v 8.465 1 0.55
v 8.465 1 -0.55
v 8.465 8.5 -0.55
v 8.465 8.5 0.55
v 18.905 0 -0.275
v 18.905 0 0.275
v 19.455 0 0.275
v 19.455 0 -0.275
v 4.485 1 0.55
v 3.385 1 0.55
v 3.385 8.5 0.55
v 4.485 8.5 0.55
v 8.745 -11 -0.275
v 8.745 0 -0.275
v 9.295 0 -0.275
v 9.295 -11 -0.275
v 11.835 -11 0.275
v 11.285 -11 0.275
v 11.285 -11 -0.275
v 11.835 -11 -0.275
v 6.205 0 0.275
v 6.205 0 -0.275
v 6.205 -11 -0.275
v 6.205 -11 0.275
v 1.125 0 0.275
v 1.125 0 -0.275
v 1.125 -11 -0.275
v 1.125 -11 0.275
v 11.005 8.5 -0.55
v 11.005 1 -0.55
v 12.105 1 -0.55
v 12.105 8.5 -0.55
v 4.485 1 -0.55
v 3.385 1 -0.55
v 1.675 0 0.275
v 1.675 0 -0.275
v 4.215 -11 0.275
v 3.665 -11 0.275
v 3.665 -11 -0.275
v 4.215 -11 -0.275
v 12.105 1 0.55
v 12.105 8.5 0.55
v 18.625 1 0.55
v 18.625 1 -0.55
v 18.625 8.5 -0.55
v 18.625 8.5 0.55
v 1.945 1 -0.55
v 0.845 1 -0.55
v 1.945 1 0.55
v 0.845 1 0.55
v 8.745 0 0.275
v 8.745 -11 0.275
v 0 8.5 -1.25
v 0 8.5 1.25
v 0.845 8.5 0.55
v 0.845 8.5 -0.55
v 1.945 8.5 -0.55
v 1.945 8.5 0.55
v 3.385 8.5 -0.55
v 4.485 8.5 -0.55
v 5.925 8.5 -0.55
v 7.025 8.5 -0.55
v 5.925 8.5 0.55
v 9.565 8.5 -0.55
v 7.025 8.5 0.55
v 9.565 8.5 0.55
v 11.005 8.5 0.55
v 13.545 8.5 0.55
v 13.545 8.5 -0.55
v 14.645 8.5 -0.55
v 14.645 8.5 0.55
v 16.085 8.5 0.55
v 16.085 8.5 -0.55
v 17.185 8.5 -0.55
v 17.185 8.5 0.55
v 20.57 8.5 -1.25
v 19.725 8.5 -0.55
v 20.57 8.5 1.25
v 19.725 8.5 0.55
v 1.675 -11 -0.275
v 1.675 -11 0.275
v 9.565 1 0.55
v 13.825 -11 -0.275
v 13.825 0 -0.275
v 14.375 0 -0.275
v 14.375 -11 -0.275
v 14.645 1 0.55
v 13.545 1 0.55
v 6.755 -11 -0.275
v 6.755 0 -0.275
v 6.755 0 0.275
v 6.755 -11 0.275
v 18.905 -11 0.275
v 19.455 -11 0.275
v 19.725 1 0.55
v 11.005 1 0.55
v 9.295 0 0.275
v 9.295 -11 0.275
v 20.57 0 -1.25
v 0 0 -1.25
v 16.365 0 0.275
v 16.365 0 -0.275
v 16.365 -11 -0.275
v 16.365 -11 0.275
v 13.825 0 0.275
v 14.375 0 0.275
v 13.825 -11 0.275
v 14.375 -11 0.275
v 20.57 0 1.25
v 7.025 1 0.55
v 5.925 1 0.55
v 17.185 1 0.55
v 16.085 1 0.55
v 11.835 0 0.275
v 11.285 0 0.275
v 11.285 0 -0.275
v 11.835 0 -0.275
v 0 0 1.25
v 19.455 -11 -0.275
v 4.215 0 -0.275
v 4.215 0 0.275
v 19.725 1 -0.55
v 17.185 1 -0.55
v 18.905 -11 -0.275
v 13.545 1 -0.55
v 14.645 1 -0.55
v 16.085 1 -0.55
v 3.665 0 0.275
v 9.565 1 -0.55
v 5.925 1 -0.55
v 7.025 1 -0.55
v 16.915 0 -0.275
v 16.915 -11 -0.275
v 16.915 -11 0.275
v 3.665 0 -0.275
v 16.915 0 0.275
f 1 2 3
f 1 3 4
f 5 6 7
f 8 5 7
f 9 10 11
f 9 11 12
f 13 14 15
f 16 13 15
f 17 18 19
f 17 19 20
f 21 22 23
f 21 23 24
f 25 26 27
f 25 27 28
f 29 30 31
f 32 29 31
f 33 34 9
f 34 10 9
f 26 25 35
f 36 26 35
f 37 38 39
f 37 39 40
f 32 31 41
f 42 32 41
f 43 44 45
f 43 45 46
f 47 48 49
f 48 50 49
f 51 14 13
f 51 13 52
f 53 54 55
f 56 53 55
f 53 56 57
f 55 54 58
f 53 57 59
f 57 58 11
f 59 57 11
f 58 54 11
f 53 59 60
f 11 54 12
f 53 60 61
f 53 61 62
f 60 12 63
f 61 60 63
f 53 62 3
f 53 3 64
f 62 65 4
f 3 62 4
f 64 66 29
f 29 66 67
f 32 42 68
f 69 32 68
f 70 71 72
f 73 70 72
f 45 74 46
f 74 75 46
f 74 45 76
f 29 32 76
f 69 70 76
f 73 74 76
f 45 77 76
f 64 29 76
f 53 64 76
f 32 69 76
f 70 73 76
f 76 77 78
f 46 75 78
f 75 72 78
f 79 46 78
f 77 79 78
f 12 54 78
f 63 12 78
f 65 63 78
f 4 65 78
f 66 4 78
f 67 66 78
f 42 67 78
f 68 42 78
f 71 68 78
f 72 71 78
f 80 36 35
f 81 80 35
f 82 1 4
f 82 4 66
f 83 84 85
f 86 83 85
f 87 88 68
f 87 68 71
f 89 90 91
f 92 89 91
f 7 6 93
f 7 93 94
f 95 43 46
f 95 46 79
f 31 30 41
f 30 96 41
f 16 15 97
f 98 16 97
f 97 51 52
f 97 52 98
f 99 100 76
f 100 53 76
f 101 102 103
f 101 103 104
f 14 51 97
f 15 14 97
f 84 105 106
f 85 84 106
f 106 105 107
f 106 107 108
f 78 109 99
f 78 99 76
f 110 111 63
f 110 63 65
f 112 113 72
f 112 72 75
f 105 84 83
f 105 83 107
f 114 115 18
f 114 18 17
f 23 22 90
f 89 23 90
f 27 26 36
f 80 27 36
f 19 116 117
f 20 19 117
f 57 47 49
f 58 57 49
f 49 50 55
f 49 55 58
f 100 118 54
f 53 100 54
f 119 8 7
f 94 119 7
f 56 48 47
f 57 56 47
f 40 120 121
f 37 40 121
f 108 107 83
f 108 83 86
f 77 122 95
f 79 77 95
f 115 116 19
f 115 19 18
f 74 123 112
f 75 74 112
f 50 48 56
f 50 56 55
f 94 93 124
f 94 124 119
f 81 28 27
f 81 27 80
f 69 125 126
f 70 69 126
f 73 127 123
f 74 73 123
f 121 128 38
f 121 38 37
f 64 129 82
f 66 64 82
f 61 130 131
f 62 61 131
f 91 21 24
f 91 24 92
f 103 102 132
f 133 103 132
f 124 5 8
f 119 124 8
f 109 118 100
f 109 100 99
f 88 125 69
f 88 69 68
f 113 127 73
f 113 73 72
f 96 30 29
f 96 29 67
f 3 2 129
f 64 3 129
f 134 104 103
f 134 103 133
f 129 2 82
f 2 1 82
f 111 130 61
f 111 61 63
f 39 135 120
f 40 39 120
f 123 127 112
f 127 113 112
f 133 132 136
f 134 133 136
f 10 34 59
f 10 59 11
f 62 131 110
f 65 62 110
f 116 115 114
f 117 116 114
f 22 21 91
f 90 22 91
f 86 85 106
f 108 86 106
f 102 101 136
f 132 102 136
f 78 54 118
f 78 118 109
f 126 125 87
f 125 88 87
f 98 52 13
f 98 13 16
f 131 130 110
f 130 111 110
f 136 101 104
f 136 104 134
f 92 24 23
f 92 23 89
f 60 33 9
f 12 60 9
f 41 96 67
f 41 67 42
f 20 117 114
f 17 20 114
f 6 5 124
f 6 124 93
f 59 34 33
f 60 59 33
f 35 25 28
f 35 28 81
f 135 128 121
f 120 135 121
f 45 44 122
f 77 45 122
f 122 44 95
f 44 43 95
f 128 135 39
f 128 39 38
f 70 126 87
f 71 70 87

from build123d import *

# Parameters (mm, degrees)
SKETCH1_W             = 20.57
SKETCH1_H             = 8.5
BOSS_EXTRUDE1_DEPTH   = 1.25
SKETCH2_W             = 1.1
SKETCH2_H             = 1.1
CUT_EXTRUDE1_DEPTH    = 9.5
SKETCH3_W             = 20.57
SKETCH3_H             = 2.5
BOSS_EXTRUDE2_DEPTH   = 1
SKETCH4_W             = 0.55
SKETCH4_H             = 0.55
BOSS_EXTRUDE3_DEPTH   = 11
BOSS_EXTRUDE3_2_DEPTH = 11
BOSS_EXTRUDE3_3_DEPTH = 11
BOSS_EXTRUDE3_4_DEPTH = 11
BOSS_EXTRUDE3_5_DEPTH = 11
BOSS_EXTRUDE3_6_DEPTH = 11
BOSS_EXTRUDE3_7_DEPTH = 11
BOSS_EXTRUDE3_8_DEPTH = 11


with BuildPart() as part:
    # Sketch1 → Boss-Extrude1 (new body, symmetric)
    with BuildSketch(Plane.XY):
        with Locations((10.285, 4.25)):
            Rectangle(SKETCH1_W, SKETCH1_H)
    extrude(amount=BOSS_EXTRUDE1_DEPTH, both=True)

    # Sketch2 → Cut-Extrude1 (cut, through all)
    with BuildSketch(Plane.XZ):
        with Locations((3.935, 0)):
            Rectangle(SKETCH2_W, SKETCH2_H)
        with Locations((1.395, 0)):
            Rectangle(SKETCH2_W, SKETCH2_H)
        with Locations((6.475, 0)):
            Rectangle(SKETCH2_W, SKETCH2_H)
        with Locations((9.015, 0)):
            Rectangle(SKETCH2_W, SKETCH2_H)
        with Locations((11.555, 0)):
            Rectangle(SKETCH2_W, SKETCH2_H)
        with Locations((14.095, 0)):
            Rectangle(SKETCH2_W, SKETCH2_H)
        with Locations((16.635, 0)):
            Rectangle(SKETCH2_W, SKETCH2_H)
        with Locations((19.175, 0)):
            Rectangle(SKETCH2_W, SKETCH2_H)
    extrude(amount=-CUT_EXTRUDE1_DEPTH, mode=Mode.SUBTRACT)

    # Sketch3 → Boss-Extrude2 (add)
    with BuildSketch(Plane.XZ):
        with Locations((10.285, 0)):
            Rectangle(SKETCH3_W, SKETCH3_H)
    extrude(amount=-BOSS_EXTRUDE2_DEPTH)


with BuildPart() as body_2:
    # Sketch4 → Boss-Extrude3 (new body)
    with BuildSketch(Plane.XZ):
        with Locations((1.4, 0)):
            Rectangle(SKETCH4_W, SKETCH4_H)
    extrude(amount=BOSS_EXTRUDE3_DEPTH)


with BuildPart() as body_3:
    # Sketch4 → Boss-Extrude3 2 (new body)
    with BuildSketch(Plane.XZ):
        with Locations((3.94, 0)):
            Rectangle(SKETCH4_W, SKETCH4_H)
    extrude(amount=BOSS_EXTRUDE3_2_DEPTH)


with BuildPart() as body_4:
    # Sketch4 → Boss-Extrude3 3 (new body)
    with BuildSketch(Plane.XZ):
        with Locations((6.48, 0)):
            Rectangle(SKETCH4_W, SKETCH4_H)
    extrude(amount=BOSS_EXTRUDE3_3_DEPTH)


with BuildPart() as body_5:
    # Sketch4 → Boss-Extrude3 4 (new body)
    with BuildSketch(Plane.XZ):
        with Locations((9.02, 0)):
            Rectangle(SKETCH4_W, SKETCH4_H)
    extrude(amount=BOSS_EXTRUDE3_4_DEPTH)


with BuildPart() as body_6:
    # Sketch4 → Boss-Extrude3 5 (new body)
    with BuildSketch(Plane.XZ):
        with Locations((11.56, 0)):
            Rectangle(SKETCH4_W, SKETCH4_H)
    extrude(amount=BOSS_EXTRUDE3_5_DEPTH)


with BuildPart() as body_7:
    # Sketch4 → Boss-Extrude3 6 (new body)
    with BuildSketch(Plane.XZ):
        with Locations((14.1, 0)):
            Rectangle(SKETCH4_W, SKETCH4_H)
    extrude(amount=BOSS_EXTRUDE3_6_DEPTH)


with BuildPart() as body_8:
    # Sketch4 → Boss-Extrude3 7 (new body)
    with BuildSketch(Plane.XZ):
        with Locations((16.64, 0)):
            Rectangle(SKETCH4_W, SKETCH4_H)
    extrude(amount=BOSS_EXTRUDE3_7_DEPTH)


with BuildPart() as body_9:
    # Sketch4 → Boss-Extrude3 8 (new body)
    with BuildSketch(Plane.XZ):
        with Locations((19.18, 0)):
            Rectangle(SKETCH4_W, SKETCH4_H)
    extrude(amount=BOSS_EXTRUDE3_8_DEPTH)


solid = Compound([part.part, body_2.part, body_3.part, body_4.part, body_5.part, body_6.part, body_7.part, body_8.part, body_9.part])
